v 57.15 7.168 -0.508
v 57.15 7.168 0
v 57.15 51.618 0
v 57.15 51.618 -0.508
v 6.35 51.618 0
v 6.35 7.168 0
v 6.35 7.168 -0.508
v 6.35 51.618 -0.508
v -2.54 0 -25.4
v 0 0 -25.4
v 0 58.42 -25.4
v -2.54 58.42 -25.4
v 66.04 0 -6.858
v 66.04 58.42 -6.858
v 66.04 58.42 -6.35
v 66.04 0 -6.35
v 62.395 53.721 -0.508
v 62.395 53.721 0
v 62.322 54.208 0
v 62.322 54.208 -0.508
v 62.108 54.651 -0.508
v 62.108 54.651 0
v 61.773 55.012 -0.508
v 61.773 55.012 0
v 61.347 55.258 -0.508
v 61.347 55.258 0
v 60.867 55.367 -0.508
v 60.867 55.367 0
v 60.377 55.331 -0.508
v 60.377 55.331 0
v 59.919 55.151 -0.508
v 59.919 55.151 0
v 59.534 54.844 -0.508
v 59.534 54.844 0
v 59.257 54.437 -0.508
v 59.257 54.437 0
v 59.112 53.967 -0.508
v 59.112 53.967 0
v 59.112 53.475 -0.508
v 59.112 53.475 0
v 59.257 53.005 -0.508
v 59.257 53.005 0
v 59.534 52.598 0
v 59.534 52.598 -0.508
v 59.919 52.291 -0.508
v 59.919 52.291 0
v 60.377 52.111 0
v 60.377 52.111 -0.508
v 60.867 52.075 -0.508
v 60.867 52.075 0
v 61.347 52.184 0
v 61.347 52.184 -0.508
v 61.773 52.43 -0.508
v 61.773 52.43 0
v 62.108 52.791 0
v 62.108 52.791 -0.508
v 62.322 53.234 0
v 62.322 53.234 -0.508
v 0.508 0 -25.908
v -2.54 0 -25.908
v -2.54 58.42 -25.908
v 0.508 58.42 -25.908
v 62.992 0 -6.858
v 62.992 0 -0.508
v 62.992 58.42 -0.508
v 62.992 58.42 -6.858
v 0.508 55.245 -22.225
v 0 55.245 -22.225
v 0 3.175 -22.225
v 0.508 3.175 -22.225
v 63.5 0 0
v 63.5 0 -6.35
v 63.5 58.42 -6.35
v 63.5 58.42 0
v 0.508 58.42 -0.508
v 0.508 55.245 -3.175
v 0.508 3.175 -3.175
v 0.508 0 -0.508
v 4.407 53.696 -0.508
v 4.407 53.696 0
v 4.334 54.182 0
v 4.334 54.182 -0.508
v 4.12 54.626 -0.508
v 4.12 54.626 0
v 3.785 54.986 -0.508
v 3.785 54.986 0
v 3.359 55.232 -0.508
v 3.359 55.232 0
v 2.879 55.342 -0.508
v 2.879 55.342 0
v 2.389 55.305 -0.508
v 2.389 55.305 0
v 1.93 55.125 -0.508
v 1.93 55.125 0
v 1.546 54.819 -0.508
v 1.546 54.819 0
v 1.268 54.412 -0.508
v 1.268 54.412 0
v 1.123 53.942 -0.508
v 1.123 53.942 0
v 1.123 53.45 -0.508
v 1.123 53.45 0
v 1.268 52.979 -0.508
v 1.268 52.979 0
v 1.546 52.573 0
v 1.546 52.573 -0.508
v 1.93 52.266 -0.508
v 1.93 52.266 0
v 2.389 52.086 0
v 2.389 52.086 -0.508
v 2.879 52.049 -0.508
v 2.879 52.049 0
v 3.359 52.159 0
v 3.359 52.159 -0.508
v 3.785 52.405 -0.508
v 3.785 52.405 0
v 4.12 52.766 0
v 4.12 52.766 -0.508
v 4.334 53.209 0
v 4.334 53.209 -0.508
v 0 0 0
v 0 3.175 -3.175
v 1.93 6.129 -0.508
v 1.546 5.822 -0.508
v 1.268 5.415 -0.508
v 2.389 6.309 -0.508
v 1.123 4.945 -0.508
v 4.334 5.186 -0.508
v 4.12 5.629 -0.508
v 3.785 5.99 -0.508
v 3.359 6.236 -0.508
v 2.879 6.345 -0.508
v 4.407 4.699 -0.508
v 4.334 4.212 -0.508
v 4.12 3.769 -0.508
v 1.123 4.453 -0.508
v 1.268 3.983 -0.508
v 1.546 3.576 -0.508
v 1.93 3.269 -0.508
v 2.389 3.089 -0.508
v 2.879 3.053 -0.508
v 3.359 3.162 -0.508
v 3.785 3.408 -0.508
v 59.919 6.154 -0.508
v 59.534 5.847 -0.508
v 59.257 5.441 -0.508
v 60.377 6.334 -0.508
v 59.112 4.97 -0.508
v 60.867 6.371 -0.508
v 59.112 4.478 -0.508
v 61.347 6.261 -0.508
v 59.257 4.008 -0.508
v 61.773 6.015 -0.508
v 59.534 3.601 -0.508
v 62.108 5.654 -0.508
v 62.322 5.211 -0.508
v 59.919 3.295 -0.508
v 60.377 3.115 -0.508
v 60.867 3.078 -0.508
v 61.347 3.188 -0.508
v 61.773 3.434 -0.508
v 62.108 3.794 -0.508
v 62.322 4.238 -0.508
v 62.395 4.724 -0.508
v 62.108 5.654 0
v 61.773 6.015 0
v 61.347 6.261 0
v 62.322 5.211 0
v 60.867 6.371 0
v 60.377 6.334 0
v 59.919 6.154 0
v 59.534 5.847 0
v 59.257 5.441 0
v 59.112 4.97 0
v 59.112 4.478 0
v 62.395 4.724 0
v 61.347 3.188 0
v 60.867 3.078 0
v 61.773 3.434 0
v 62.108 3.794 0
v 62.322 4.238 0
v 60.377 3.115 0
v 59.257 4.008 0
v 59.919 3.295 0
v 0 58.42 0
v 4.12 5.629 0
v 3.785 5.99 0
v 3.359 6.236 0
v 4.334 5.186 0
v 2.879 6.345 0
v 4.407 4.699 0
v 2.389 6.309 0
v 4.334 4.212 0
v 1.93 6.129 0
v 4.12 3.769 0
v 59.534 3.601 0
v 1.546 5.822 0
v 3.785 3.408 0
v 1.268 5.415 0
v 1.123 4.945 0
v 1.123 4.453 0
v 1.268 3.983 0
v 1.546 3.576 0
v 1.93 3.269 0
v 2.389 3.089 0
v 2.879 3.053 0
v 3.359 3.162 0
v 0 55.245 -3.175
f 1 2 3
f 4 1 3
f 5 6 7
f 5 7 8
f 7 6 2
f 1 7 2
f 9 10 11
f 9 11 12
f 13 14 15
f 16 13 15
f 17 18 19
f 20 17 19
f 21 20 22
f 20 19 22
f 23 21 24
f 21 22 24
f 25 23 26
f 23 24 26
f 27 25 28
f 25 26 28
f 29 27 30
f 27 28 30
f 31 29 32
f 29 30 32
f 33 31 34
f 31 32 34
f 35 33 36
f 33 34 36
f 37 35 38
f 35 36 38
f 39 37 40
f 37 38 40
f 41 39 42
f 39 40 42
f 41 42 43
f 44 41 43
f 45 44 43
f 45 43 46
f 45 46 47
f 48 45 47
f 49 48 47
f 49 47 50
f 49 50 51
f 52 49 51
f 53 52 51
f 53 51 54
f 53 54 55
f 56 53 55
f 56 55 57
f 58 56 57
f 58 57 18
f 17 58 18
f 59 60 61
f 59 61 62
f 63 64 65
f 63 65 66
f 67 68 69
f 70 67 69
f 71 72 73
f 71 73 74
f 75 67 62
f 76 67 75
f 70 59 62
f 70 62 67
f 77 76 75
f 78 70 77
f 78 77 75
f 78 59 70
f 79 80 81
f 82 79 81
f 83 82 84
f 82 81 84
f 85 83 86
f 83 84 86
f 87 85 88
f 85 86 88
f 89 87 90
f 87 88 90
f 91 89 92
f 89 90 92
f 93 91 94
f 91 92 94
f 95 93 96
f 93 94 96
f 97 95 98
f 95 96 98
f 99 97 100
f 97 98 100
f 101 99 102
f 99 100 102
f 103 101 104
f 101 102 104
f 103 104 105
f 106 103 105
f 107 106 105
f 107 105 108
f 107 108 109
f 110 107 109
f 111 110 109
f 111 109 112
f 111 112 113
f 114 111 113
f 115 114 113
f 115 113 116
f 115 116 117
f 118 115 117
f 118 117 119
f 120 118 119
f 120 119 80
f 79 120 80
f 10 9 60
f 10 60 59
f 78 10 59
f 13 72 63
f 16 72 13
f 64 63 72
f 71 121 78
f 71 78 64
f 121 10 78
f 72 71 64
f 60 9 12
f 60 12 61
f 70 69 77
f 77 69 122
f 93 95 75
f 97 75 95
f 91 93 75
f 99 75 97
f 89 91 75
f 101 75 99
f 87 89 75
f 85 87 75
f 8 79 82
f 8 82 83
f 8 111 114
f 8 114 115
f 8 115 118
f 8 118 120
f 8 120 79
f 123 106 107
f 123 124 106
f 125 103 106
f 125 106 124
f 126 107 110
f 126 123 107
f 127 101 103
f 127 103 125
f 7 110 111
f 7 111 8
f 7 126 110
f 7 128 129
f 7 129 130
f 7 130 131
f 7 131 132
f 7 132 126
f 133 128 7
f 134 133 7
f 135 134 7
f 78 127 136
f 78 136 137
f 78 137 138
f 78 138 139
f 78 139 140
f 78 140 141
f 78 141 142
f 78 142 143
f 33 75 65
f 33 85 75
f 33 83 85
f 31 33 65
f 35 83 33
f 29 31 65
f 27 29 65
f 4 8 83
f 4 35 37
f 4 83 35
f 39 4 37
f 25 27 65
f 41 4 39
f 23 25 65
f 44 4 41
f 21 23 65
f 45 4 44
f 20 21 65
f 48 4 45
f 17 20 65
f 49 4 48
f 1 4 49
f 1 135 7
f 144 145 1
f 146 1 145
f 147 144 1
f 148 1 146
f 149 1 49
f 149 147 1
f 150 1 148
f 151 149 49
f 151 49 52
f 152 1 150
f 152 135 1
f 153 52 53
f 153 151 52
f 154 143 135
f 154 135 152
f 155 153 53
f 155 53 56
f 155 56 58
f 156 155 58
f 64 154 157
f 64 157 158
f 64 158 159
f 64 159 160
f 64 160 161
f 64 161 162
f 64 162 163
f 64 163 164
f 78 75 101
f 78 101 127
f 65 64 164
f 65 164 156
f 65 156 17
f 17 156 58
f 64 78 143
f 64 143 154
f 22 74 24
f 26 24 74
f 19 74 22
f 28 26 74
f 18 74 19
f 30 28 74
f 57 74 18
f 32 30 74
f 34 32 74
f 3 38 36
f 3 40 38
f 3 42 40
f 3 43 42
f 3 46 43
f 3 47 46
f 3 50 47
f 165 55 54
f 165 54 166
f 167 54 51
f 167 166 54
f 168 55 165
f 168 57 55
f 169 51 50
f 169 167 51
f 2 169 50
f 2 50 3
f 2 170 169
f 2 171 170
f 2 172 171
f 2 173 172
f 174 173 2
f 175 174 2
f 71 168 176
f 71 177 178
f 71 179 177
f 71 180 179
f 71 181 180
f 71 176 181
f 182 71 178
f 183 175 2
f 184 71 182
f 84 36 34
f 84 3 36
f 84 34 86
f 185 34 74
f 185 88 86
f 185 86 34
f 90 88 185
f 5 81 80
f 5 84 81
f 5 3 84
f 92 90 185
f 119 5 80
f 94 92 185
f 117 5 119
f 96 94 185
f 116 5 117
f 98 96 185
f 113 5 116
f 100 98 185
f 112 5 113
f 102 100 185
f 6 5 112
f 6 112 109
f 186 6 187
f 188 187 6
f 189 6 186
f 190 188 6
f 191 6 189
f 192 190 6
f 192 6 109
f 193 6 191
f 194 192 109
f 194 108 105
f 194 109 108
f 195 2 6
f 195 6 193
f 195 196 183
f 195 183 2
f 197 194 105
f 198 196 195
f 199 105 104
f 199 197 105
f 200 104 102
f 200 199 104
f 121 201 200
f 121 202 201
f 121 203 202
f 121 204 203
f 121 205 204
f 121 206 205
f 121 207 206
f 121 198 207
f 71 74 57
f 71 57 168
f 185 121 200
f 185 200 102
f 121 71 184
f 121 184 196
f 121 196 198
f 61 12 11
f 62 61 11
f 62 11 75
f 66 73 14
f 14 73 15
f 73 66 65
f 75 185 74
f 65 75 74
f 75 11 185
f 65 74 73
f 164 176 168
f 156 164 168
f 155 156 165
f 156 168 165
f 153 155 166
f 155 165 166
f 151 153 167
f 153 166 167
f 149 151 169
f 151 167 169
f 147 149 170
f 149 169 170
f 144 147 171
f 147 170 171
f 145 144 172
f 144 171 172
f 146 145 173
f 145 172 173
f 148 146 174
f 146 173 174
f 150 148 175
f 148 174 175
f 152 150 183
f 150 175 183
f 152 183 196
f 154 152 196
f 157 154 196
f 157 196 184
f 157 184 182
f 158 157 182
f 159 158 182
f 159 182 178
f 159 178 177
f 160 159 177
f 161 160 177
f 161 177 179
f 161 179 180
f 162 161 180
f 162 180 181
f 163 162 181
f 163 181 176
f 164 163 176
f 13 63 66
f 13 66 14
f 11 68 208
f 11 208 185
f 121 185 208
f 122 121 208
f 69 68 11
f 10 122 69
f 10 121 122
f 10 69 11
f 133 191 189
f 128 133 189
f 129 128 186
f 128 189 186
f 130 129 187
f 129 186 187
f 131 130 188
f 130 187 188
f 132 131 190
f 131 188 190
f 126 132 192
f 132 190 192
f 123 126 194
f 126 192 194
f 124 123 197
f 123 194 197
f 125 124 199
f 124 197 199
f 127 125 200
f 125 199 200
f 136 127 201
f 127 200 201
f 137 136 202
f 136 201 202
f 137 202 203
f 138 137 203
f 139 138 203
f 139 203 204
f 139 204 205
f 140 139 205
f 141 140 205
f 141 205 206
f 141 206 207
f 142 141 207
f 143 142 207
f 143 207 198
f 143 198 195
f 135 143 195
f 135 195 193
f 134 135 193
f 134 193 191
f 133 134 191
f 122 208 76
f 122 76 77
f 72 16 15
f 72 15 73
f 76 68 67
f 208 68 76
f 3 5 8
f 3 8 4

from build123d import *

# Parameters (mm, degrees)
F1_DEPTH = 58.42
F2_R     = 1.651
F3_DEPTH = 25.4
F4_W     = 50.8
F4_H     = 44.45
F5_DEPTH = 25.909
F6_W     = 52.07
F6_H     = 19.05
F7_DEPTH = 25.4


with BuildPart() as f1:
    # F0 (on Front) → F1 (new body)
    with BuildSketch(Plane.XZ):
        Polygon((63.5, 0), (0, 0), (0, -25.4), (-2.54, -25.4), (-2.54, -25.908), (0.508, -25.908), (0.508, -0.508), (62.992, -0.508), (62.992, -6.858), (66.04, -6.858), (66.04, -6.35), (63.5, -6.35), align=None)
    extrude(amount=-F1_DEPTH)

    # F2 (on face) → F3 (cut)
    with BuildSketch(Plane.XY):
        with Locations((2.7559, 53.6956)):
            Circle(F2_R)
        with Locations((2.7559, 4.699)):
            Circle(F2_R)
        with Locations((60.7441, 53.721)):
            Circle(F2_R)
        with Locations((60.7441, 4.7244)):
            Circle(F2_R)
    extrude(amount=-F3_DEPTH, mode=Mode.SUBTRACT)

    # F4 (on face) → F5 (cut, through all)
    with BuildSketch(Plane.XY):
        with Locations((31.75, 29.392602)):
            Rectangle(F4_W, F4_H)
    extrude(amount=-F5_DEPTH, mode=Mode.SUBTRACT)

    # F6 (on face) → F7 (cut)
    with BuildSketch(Plane(origin=(0, 0, 0), x_dir=(0, -1, 0), z_dir=(-1, 0, 0))):
        with Locations((-29.21, -12.7)):
            Rectangle(F6_W, F6_H)
    extrude(amount=-F7_DEPTH, mode=Mode.SUBTRACT)


solid = f1.part
